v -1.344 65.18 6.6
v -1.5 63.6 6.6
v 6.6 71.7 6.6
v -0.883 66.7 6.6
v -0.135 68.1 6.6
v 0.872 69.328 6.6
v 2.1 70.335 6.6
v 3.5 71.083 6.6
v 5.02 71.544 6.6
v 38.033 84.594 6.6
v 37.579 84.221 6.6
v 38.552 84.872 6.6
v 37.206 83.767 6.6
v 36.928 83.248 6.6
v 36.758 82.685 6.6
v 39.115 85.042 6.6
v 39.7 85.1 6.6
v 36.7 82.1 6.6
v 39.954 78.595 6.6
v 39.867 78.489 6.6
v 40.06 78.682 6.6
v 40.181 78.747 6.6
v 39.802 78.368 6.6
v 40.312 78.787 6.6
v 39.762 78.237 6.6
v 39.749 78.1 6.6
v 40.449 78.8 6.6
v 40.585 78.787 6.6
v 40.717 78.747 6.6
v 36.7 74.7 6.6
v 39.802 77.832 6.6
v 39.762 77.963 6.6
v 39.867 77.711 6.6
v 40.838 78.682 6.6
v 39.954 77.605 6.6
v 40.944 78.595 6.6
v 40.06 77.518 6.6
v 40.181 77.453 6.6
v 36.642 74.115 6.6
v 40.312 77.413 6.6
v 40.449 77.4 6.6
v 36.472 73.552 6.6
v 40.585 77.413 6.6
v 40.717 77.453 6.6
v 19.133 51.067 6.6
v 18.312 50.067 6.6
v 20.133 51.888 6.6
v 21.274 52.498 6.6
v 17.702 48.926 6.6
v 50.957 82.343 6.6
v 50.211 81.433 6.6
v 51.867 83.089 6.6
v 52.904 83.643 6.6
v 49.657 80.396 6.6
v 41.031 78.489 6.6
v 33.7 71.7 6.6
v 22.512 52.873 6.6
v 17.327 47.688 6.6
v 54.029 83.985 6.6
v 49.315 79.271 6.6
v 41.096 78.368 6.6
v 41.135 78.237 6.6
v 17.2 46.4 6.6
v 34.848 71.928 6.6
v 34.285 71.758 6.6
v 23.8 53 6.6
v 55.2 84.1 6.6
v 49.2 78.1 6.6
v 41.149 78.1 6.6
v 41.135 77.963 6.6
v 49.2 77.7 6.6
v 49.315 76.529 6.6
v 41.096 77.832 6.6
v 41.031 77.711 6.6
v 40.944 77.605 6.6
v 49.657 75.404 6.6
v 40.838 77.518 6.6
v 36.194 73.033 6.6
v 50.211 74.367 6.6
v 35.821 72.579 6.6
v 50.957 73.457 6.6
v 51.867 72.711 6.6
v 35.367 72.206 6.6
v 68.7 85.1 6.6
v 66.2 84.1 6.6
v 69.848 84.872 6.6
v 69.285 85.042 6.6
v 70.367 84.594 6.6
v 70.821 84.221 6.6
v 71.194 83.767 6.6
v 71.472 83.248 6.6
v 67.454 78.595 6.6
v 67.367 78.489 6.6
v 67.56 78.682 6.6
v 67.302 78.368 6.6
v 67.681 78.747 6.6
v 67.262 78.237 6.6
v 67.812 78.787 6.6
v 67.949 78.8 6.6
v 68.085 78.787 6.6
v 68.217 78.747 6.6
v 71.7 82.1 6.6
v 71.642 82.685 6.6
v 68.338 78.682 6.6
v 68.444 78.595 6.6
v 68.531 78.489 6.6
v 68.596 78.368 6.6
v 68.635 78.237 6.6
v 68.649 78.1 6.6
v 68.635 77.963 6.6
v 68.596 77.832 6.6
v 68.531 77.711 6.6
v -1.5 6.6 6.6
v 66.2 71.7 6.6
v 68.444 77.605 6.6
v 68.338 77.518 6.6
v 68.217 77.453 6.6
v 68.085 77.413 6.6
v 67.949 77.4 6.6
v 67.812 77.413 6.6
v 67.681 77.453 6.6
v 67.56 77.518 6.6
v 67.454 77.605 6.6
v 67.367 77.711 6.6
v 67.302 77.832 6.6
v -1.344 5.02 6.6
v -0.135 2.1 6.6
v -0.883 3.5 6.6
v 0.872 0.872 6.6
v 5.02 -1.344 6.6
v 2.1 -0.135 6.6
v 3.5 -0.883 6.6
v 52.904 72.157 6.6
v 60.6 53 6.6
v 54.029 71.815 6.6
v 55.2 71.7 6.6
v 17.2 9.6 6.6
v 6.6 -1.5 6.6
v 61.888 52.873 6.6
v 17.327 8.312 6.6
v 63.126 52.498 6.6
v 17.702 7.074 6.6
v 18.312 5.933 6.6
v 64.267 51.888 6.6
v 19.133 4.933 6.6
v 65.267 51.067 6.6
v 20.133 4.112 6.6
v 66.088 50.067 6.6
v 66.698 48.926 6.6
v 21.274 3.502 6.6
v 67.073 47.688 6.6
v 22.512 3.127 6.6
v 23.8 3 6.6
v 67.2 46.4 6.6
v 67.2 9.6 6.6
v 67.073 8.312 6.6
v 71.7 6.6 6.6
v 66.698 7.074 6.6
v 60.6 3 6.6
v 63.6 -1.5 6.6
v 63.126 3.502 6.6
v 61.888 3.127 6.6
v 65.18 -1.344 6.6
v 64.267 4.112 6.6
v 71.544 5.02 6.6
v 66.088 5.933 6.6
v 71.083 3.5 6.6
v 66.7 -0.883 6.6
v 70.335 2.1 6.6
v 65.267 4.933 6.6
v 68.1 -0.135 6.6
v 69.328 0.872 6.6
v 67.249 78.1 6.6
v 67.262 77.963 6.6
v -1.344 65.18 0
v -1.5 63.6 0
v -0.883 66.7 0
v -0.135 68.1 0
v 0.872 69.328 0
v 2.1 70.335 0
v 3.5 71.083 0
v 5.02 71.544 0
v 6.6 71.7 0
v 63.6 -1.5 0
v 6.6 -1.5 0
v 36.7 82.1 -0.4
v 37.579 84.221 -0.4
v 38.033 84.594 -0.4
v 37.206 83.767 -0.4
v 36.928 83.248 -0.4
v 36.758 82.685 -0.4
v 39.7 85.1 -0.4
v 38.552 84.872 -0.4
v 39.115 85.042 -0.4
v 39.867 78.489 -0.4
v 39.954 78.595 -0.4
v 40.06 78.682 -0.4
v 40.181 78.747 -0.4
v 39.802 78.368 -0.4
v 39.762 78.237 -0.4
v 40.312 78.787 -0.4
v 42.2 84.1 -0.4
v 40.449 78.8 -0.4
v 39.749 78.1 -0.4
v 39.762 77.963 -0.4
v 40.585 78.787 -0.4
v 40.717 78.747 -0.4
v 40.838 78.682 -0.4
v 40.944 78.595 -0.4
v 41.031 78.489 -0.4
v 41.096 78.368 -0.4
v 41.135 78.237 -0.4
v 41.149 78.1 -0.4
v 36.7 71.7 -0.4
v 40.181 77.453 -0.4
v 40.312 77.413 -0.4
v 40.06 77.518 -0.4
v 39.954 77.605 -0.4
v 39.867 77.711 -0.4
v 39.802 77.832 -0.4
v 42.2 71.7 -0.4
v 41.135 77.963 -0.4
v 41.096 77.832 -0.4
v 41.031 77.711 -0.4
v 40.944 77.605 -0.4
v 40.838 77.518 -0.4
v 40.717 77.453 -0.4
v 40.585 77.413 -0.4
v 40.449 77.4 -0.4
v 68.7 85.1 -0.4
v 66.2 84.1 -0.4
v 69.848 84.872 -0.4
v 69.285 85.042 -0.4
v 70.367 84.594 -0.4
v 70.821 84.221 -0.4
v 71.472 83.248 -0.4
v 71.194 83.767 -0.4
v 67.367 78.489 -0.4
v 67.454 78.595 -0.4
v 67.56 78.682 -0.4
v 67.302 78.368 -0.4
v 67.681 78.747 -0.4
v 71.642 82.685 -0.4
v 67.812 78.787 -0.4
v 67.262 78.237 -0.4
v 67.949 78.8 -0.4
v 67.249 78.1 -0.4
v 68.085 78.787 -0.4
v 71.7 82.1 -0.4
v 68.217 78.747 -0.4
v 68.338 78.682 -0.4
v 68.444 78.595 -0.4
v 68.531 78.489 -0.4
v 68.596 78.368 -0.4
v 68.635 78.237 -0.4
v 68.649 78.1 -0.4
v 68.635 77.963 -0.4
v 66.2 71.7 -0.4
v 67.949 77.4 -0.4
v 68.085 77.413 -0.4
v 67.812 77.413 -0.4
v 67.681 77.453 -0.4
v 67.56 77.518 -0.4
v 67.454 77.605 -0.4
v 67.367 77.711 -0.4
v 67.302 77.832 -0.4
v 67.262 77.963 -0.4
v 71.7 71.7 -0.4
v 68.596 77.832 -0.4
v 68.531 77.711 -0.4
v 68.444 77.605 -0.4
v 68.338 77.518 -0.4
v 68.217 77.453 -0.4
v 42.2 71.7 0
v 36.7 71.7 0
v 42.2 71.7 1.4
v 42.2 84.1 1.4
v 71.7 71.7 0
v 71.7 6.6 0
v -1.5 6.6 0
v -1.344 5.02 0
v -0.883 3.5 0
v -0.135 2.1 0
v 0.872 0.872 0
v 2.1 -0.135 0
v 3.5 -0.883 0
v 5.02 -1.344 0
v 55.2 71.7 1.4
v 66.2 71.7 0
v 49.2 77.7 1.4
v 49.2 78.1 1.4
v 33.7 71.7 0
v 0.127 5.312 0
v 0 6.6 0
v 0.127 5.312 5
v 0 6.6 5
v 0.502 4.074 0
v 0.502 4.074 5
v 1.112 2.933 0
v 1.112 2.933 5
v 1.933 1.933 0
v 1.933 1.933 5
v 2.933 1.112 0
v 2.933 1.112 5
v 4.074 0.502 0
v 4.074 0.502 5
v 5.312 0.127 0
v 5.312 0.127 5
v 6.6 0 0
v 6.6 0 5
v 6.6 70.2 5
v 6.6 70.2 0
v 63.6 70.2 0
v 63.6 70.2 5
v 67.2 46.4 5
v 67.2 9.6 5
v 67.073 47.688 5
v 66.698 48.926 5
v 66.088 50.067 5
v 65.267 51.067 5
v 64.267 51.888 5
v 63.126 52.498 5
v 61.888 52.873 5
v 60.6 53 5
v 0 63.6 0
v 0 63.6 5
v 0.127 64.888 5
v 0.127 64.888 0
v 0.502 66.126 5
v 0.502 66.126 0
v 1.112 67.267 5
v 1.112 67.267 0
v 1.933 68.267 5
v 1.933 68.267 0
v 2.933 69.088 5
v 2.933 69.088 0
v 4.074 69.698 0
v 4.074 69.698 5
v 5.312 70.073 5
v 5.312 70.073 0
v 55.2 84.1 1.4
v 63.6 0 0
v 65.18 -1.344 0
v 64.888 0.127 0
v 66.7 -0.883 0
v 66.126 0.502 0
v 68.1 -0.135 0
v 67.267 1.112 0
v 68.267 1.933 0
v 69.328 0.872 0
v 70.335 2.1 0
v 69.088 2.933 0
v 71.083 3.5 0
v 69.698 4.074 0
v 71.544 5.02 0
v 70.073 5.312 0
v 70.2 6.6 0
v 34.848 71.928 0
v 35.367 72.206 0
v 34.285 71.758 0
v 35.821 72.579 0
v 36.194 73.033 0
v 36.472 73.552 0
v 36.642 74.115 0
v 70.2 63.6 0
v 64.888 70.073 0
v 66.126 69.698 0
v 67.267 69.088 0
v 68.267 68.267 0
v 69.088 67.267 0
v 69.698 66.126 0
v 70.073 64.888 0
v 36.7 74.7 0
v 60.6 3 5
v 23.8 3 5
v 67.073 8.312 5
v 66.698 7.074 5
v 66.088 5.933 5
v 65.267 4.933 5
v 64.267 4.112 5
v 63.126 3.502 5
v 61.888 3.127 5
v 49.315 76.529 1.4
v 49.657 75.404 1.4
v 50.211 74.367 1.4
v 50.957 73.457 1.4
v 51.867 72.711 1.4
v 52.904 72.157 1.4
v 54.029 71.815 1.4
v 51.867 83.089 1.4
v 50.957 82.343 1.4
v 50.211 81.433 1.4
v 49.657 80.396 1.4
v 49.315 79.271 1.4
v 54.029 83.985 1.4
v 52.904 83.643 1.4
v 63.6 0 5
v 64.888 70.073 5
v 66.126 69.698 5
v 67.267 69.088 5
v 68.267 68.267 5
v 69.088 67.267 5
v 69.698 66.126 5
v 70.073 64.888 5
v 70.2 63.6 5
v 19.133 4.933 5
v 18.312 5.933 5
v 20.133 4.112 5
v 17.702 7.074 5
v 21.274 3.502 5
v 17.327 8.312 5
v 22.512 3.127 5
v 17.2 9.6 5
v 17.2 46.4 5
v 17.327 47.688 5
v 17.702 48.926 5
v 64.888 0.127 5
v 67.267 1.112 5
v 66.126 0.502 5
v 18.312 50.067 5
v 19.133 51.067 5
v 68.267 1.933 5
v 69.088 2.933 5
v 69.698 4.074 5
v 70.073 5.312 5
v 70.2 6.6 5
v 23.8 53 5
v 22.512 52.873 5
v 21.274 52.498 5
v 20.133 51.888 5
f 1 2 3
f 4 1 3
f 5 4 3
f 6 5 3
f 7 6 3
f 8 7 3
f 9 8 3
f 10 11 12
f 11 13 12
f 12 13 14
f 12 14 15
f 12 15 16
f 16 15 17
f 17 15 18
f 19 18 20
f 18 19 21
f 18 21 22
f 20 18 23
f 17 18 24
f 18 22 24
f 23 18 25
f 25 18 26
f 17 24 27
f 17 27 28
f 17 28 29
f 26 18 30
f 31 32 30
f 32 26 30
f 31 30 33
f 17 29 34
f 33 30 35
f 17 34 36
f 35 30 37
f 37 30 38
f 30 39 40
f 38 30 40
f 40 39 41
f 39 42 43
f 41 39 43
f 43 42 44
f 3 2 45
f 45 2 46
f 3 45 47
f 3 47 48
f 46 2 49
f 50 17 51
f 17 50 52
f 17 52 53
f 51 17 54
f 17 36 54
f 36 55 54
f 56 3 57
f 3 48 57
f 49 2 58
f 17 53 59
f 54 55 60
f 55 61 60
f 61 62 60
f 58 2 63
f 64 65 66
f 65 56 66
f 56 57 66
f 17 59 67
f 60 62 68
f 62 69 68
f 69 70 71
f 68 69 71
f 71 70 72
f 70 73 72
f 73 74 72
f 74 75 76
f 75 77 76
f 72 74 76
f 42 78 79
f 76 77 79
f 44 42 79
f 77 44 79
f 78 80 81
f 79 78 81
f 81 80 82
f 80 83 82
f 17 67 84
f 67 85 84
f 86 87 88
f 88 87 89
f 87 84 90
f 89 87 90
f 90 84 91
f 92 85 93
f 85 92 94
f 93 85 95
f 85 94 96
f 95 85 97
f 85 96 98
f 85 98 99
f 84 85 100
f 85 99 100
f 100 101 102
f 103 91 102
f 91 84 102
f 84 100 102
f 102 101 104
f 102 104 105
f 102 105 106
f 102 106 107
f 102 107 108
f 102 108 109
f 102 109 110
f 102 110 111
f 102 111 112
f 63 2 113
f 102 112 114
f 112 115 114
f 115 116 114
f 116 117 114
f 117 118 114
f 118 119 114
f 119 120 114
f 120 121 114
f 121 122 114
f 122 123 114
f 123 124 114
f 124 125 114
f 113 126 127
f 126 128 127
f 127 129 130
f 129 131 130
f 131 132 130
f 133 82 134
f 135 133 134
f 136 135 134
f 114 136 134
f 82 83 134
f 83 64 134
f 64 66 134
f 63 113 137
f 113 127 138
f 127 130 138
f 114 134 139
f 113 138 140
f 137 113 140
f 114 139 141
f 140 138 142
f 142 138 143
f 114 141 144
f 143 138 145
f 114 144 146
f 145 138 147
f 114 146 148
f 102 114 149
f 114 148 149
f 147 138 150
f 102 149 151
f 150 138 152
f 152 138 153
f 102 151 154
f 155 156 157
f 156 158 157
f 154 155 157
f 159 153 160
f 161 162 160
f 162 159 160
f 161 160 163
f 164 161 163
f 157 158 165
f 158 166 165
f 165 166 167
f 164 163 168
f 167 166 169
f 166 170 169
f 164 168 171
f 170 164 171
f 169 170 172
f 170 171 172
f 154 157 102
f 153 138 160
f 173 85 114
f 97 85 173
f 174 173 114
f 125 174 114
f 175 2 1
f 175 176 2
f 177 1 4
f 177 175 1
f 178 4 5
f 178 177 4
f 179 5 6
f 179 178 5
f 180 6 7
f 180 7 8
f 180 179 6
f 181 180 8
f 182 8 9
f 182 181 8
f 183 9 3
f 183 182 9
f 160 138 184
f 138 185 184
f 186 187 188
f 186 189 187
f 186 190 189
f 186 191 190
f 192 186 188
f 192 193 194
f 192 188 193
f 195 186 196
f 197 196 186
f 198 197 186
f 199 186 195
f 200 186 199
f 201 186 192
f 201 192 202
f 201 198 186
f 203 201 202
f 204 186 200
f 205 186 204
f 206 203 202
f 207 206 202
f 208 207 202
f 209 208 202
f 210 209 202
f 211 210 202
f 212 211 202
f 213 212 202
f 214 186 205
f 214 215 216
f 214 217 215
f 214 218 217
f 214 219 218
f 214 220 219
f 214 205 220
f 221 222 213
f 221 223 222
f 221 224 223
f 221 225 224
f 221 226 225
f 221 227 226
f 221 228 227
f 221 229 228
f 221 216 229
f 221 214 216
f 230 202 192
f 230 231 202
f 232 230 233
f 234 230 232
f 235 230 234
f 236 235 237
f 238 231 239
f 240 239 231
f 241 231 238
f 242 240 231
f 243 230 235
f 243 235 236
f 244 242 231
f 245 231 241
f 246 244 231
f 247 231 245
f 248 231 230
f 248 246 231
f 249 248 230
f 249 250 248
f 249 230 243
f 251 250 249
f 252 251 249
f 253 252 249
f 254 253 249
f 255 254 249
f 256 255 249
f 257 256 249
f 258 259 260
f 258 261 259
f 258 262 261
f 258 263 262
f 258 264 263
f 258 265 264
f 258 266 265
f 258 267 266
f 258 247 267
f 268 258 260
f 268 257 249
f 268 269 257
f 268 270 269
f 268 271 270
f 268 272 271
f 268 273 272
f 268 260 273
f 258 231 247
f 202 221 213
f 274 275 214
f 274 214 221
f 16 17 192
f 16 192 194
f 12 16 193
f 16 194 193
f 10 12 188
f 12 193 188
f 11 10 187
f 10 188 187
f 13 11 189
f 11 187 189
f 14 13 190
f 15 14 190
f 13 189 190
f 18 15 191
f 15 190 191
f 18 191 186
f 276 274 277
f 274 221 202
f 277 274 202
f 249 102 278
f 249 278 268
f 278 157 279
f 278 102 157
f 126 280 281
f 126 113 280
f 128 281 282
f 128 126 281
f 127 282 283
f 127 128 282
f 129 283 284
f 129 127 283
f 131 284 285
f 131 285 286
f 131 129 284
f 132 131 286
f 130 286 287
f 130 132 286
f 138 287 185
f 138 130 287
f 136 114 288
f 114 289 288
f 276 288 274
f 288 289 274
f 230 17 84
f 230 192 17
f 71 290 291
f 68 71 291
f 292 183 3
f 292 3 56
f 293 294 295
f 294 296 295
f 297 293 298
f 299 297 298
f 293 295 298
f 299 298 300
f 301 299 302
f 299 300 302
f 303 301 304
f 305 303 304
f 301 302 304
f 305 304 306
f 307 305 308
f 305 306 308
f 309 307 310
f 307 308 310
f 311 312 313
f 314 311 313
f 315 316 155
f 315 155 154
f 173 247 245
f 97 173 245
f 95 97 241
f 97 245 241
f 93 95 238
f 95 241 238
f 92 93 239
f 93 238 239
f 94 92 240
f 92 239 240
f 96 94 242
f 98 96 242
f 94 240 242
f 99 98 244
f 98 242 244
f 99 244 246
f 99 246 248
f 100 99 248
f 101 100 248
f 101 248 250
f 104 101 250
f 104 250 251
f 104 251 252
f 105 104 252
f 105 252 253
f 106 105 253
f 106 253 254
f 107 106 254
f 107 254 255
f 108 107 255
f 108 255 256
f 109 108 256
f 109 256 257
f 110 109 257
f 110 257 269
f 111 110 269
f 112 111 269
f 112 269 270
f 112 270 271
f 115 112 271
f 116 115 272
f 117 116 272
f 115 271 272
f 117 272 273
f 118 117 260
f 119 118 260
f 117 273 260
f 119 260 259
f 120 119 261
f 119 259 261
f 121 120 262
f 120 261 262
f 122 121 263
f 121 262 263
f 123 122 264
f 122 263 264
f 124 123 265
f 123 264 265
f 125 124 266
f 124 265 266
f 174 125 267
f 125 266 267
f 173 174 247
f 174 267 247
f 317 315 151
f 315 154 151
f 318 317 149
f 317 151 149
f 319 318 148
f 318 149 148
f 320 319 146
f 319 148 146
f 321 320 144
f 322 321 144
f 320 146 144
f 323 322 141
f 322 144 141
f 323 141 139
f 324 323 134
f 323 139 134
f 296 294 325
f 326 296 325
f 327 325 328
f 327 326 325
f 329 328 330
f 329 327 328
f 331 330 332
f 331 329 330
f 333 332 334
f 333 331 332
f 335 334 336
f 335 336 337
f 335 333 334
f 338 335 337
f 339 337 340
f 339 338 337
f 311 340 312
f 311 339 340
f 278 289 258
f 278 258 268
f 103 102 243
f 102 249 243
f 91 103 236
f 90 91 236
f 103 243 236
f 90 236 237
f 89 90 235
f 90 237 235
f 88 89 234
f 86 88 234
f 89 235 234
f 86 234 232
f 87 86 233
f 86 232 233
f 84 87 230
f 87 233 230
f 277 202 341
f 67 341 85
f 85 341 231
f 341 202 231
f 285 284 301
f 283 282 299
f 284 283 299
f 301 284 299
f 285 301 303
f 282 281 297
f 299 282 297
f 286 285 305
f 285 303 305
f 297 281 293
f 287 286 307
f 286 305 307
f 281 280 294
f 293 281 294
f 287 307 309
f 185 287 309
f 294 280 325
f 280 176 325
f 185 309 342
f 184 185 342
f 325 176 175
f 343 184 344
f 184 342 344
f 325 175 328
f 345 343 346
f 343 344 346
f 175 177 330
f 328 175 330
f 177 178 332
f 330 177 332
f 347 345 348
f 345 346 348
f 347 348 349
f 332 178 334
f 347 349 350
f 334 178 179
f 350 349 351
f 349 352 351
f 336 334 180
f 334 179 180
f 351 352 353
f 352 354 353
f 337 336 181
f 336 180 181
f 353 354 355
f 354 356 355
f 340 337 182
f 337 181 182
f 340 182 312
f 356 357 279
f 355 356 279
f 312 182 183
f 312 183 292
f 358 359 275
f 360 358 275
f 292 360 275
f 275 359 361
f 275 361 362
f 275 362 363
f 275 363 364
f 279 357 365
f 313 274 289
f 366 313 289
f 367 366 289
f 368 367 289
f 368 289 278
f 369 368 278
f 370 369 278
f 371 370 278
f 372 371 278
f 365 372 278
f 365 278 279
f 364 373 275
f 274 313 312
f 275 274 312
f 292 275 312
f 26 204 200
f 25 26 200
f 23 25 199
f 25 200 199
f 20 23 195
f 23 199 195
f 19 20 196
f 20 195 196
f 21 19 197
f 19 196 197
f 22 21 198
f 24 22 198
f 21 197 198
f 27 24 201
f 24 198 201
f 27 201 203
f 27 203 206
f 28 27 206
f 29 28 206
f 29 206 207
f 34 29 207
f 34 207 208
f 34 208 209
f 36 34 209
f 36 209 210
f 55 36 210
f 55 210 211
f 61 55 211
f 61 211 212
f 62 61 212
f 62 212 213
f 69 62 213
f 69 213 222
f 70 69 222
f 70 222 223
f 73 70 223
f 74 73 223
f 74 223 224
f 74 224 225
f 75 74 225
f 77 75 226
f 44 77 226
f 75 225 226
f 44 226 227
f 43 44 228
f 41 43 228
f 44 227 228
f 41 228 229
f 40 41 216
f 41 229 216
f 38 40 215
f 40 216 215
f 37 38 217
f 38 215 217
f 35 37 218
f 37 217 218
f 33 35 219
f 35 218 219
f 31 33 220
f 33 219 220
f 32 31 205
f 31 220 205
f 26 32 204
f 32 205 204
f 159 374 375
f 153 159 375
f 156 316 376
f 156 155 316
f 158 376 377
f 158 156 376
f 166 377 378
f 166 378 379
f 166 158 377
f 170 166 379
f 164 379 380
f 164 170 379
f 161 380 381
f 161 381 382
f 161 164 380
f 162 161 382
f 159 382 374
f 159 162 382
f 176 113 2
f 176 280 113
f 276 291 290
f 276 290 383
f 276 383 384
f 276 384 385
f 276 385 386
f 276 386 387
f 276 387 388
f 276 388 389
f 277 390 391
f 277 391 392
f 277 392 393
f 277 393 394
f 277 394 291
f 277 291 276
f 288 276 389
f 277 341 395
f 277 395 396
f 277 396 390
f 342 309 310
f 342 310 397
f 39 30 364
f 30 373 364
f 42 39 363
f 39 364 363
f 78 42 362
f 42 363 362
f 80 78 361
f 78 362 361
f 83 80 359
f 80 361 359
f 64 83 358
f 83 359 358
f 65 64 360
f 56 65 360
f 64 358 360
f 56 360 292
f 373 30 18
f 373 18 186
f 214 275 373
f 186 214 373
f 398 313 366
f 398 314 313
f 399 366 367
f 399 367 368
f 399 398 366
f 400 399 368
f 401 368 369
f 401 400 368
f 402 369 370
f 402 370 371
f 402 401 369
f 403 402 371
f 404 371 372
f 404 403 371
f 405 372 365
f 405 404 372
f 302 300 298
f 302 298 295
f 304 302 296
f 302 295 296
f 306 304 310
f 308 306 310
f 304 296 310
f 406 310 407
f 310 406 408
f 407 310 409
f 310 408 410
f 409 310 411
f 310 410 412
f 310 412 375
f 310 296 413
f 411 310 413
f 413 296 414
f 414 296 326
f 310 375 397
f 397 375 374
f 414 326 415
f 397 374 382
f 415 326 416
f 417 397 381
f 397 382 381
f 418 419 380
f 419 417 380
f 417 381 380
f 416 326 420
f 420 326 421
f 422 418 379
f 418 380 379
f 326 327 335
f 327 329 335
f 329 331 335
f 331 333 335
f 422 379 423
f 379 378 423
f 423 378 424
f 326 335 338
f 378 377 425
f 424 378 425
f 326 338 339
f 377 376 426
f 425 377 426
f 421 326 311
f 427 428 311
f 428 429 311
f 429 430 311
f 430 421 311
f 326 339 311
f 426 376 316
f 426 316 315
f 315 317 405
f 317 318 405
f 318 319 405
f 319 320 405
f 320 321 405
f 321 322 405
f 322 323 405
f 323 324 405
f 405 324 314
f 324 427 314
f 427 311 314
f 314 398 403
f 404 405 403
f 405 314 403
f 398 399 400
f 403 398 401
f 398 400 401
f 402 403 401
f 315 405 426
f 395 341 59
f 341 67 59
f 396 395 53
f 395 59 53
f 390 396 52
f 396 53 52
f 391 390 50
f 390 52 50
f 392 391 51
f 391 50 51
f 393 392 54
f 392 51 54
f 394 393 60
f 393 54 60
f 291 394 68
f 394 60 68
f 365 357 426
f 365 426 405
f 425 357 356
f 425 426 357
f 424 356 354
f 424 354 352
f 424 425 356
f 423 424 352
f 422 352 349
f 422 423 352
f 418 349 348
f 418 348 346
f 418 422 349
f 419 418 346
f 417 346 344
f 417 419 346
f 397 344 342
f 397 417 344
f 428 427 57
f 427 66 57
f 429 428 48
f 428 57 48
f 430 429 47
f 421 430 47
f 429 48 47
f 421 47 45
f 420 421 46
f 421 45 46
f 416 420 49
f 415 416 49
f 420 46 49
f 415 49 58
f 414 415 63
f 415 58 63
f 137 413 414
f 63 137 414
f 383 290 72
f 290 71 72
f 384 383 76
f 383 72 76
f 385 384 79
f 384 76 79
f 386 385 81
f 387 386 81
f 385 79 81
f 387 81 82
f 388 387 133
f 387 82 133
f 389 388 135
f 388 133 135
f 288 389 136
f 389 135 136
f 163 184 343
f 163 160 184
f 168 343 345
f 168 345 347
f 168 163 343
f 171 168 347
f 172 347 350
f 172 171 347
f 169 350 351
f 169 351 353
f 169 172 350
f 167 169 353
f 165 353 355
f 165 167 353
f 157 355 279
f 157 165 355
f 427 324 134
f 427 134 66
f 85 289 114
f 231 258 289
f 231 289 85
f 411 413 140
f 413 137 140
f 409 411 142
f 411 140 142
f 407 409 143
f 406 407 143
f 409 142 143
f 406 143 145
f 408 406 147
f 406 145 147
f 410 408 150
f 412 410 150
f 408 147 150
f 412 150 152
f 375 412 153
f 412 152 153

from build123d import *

# Parameters (mm, degrees)
SKETCH1_W           = 73.2
SKETCH1_H           = 73.2
SKETCH1_W_2         = 70.2
SKETCH1_H_2         = 70.2
BOSS_EXTRUDE1_DEPTH = 5
SKETCH2_W           = 73.2
SKETCH2_H           = 73.2
BOSS_EXTRUDE2_DEPTH = 1.6
FILLET1_R           = 6.6
SKETCH3_W           = 50
SKETCH3_H           = 50
CUT_EXTRUDE1_DEPTH  = 1.6
FILLET2_R           = 6.6
SKETCH5_W           = 35
SKETCH5_H           = 12.4
BOSS_EXTRUDE3_DEPTH = 7
SKETCH6_W           = 24
SKETCH6_H           = 12.4
CUT_EXTRUDE2_DEPTH  = 1.8
SKETCH7_W           = 17
SKETCH7_H           = 12.4
CUT_EXTRUDE3_DEPTH  = 10.8
SKETCH8_W           = 35
SKETCH8_H           = 7
BOSS_EXTRUDE4_DEPTH = 1
FILLET3_R           = 8.1
FILLET4_R           = 3
FILLET5_R           = 6
SKETCH9_R           = 0.7
CUT_EXTRUDE4_DEPTH  = 10


with BuildPart() as part:
    # Sketch1 → Boss-Extrude1 (new body)
    with BuildSketch(Plane.XY):
        with Locations((35.1, 35.1)):
            Rectangle(SKETCH1_W, SKETCH1_H)
        with Locations((35.1, 35.1)):
            Rectangle(SKETCH1_W_2, SKETCH1_H_2, mode=Mode.SUBTRACT)
    extrude(amount=BOSS_EXTRUDE1_DEPTH)

    # Sketch2 → Boss-Extrude2 (add)
    with BuildSketch(Plane.XY.offset(5)):
        with Locations((35.1, 35.1)):
            Rectangle(SKETCH2_W, SKETCH2_H)
    extrude(amount=BOSS_EXTRUDE2_DEPTH)

    # Fillet1
    fillet1_edges = [part.edges().sort_by_distance(p)[0] for p in [
        (0, 70.2, 2.5),
        (0, 0, 2.5),
        (70.2, 0, 2.5),
        (70.2, 70.2, 2.5),
    ]]
    fillet(fillet1_edges, radius=FILLET1_R)

    # Sketch3 → Cut-Extrude1 (cut)
    with BuildSketch(Plane(origin=(0, 0, 5), x_dir=(-1, 0, 0), z_dir=(0, 0, -1))):
        with Locations((-42.2, 28)):
            Rectangle(SKETCH3_W, SKETCH3_H)
    extrude(amount=-CUT_EXTRUDE1_DEPTH, mode=Mode.SUBTRACT)

    # Fillet2
    fillet2_edges = [part.edges().sort_by_distance(p)[0] for p in [
        (67.2, 3, 5.8),
        (67.2, 53, 5.8),
        (17.2, 53, 5.8),
        (17.2, 3, 5.8),
    ]]
    fillet(fillet2_edges, radius=FILLET2_R)

    # Sketch5 → Boss-Extrude3 (add)
    with BuildSketch(Plane.XY.offset(6.6)):
        with Locations((54.2, 77.9)):
            Rectangle(SKETCH5_W, SKETCH5_H)
    extrude(amount=-BOSS_EXTRUDE3_DEPTH)

    # Sketch6 → Cut-Extrude2 (cut)
    with BuildSketch(Plane(origin=(0, 0, -0.4), x_dir=(-1, 0, 0), z_dir=(0, 0, -1))):
        with Locations((-54.2, 77.9)):
            Rectangle(SKETCH6_W, SKETCH6_H)
    extrude(amount=-CUT_EXTRUDE2_DEPTH, mode=Mode.SUBTRACT)

    # Sketch7 → Cut-Extrude3 (cut)
    with BuildSketch(Plane(origin=(0, 0, 1.4), x_dir=(-1, 0, 0), z_dir=(0, 0, -1))):
        with Locations((-57.7, 77.9)):
            Rectangle(SKETCH7_W, SKETCH7_H)
    extrude(amount=-CUT_EXTRUDE3_DEPTH, mode=Mode.SUBTRACT)

    # Sketch8 → Boss-Extrude4 (add)
    with BuildSketch(Plane(origin=(0, 84.1, 0), x_dir=(1, 0, 0), z_dir=(0, 1, 0))):
        with Locations((54.2, -3.1)):
            Rectangle(SKETCH8_W, SKETCH8_H)
    extrude(amount=BOSS_EXTRUDE4_DEPTH)

    # Fillet3
    fillet3_edges = [part.edges().sort_by_distance(p)[0] for p in [
        (71.7, -1.5, 3.3),
        (-1.5, -1.5, 3.3),
        (-1.5, 71.7, 3.3),
    ]]
    fillet(fillet3_edges, radius=FILLET3_R)

    # Fillet4
    fillet4_edges = [part.edges().sort_by_distance(p)[0] for p in [
        (71.7, 85.1, 3.1),
        (36.7, 85.1, 3.1),
        (36.7, 71.7, 3.3),
    ]]
    fillet(fillet4_edges, radius=FILLET4_R)

    # Fillet5
    fillet5_edges = [part.edges().sort_by_distance(p)[0] for p in [
        (49.2, 84.1, 4),
        (49.2, 71.7, 4),
    ]]
    fillet(fillet5_edges, radius=FILLET5_R)

    # Sketch9 → Cut-Extrude4 (cut)
    with BuildSketch(Plane(origin=(0, 0, -0.4), x_dir=(-1, 0, 0), z_dir=(0, 0, -1))):
        with Locations((-40.448812376, 78.1)):
            Circle(SKETCH9_R)
        with Locations((-67.948812376, 78.1)):
            Circle(SKETCH9_R)
    extrude(amount=-CUT_EXTRUDE4_DEPTH, mode=Mode.SUBTRACT)


solid = part.part
